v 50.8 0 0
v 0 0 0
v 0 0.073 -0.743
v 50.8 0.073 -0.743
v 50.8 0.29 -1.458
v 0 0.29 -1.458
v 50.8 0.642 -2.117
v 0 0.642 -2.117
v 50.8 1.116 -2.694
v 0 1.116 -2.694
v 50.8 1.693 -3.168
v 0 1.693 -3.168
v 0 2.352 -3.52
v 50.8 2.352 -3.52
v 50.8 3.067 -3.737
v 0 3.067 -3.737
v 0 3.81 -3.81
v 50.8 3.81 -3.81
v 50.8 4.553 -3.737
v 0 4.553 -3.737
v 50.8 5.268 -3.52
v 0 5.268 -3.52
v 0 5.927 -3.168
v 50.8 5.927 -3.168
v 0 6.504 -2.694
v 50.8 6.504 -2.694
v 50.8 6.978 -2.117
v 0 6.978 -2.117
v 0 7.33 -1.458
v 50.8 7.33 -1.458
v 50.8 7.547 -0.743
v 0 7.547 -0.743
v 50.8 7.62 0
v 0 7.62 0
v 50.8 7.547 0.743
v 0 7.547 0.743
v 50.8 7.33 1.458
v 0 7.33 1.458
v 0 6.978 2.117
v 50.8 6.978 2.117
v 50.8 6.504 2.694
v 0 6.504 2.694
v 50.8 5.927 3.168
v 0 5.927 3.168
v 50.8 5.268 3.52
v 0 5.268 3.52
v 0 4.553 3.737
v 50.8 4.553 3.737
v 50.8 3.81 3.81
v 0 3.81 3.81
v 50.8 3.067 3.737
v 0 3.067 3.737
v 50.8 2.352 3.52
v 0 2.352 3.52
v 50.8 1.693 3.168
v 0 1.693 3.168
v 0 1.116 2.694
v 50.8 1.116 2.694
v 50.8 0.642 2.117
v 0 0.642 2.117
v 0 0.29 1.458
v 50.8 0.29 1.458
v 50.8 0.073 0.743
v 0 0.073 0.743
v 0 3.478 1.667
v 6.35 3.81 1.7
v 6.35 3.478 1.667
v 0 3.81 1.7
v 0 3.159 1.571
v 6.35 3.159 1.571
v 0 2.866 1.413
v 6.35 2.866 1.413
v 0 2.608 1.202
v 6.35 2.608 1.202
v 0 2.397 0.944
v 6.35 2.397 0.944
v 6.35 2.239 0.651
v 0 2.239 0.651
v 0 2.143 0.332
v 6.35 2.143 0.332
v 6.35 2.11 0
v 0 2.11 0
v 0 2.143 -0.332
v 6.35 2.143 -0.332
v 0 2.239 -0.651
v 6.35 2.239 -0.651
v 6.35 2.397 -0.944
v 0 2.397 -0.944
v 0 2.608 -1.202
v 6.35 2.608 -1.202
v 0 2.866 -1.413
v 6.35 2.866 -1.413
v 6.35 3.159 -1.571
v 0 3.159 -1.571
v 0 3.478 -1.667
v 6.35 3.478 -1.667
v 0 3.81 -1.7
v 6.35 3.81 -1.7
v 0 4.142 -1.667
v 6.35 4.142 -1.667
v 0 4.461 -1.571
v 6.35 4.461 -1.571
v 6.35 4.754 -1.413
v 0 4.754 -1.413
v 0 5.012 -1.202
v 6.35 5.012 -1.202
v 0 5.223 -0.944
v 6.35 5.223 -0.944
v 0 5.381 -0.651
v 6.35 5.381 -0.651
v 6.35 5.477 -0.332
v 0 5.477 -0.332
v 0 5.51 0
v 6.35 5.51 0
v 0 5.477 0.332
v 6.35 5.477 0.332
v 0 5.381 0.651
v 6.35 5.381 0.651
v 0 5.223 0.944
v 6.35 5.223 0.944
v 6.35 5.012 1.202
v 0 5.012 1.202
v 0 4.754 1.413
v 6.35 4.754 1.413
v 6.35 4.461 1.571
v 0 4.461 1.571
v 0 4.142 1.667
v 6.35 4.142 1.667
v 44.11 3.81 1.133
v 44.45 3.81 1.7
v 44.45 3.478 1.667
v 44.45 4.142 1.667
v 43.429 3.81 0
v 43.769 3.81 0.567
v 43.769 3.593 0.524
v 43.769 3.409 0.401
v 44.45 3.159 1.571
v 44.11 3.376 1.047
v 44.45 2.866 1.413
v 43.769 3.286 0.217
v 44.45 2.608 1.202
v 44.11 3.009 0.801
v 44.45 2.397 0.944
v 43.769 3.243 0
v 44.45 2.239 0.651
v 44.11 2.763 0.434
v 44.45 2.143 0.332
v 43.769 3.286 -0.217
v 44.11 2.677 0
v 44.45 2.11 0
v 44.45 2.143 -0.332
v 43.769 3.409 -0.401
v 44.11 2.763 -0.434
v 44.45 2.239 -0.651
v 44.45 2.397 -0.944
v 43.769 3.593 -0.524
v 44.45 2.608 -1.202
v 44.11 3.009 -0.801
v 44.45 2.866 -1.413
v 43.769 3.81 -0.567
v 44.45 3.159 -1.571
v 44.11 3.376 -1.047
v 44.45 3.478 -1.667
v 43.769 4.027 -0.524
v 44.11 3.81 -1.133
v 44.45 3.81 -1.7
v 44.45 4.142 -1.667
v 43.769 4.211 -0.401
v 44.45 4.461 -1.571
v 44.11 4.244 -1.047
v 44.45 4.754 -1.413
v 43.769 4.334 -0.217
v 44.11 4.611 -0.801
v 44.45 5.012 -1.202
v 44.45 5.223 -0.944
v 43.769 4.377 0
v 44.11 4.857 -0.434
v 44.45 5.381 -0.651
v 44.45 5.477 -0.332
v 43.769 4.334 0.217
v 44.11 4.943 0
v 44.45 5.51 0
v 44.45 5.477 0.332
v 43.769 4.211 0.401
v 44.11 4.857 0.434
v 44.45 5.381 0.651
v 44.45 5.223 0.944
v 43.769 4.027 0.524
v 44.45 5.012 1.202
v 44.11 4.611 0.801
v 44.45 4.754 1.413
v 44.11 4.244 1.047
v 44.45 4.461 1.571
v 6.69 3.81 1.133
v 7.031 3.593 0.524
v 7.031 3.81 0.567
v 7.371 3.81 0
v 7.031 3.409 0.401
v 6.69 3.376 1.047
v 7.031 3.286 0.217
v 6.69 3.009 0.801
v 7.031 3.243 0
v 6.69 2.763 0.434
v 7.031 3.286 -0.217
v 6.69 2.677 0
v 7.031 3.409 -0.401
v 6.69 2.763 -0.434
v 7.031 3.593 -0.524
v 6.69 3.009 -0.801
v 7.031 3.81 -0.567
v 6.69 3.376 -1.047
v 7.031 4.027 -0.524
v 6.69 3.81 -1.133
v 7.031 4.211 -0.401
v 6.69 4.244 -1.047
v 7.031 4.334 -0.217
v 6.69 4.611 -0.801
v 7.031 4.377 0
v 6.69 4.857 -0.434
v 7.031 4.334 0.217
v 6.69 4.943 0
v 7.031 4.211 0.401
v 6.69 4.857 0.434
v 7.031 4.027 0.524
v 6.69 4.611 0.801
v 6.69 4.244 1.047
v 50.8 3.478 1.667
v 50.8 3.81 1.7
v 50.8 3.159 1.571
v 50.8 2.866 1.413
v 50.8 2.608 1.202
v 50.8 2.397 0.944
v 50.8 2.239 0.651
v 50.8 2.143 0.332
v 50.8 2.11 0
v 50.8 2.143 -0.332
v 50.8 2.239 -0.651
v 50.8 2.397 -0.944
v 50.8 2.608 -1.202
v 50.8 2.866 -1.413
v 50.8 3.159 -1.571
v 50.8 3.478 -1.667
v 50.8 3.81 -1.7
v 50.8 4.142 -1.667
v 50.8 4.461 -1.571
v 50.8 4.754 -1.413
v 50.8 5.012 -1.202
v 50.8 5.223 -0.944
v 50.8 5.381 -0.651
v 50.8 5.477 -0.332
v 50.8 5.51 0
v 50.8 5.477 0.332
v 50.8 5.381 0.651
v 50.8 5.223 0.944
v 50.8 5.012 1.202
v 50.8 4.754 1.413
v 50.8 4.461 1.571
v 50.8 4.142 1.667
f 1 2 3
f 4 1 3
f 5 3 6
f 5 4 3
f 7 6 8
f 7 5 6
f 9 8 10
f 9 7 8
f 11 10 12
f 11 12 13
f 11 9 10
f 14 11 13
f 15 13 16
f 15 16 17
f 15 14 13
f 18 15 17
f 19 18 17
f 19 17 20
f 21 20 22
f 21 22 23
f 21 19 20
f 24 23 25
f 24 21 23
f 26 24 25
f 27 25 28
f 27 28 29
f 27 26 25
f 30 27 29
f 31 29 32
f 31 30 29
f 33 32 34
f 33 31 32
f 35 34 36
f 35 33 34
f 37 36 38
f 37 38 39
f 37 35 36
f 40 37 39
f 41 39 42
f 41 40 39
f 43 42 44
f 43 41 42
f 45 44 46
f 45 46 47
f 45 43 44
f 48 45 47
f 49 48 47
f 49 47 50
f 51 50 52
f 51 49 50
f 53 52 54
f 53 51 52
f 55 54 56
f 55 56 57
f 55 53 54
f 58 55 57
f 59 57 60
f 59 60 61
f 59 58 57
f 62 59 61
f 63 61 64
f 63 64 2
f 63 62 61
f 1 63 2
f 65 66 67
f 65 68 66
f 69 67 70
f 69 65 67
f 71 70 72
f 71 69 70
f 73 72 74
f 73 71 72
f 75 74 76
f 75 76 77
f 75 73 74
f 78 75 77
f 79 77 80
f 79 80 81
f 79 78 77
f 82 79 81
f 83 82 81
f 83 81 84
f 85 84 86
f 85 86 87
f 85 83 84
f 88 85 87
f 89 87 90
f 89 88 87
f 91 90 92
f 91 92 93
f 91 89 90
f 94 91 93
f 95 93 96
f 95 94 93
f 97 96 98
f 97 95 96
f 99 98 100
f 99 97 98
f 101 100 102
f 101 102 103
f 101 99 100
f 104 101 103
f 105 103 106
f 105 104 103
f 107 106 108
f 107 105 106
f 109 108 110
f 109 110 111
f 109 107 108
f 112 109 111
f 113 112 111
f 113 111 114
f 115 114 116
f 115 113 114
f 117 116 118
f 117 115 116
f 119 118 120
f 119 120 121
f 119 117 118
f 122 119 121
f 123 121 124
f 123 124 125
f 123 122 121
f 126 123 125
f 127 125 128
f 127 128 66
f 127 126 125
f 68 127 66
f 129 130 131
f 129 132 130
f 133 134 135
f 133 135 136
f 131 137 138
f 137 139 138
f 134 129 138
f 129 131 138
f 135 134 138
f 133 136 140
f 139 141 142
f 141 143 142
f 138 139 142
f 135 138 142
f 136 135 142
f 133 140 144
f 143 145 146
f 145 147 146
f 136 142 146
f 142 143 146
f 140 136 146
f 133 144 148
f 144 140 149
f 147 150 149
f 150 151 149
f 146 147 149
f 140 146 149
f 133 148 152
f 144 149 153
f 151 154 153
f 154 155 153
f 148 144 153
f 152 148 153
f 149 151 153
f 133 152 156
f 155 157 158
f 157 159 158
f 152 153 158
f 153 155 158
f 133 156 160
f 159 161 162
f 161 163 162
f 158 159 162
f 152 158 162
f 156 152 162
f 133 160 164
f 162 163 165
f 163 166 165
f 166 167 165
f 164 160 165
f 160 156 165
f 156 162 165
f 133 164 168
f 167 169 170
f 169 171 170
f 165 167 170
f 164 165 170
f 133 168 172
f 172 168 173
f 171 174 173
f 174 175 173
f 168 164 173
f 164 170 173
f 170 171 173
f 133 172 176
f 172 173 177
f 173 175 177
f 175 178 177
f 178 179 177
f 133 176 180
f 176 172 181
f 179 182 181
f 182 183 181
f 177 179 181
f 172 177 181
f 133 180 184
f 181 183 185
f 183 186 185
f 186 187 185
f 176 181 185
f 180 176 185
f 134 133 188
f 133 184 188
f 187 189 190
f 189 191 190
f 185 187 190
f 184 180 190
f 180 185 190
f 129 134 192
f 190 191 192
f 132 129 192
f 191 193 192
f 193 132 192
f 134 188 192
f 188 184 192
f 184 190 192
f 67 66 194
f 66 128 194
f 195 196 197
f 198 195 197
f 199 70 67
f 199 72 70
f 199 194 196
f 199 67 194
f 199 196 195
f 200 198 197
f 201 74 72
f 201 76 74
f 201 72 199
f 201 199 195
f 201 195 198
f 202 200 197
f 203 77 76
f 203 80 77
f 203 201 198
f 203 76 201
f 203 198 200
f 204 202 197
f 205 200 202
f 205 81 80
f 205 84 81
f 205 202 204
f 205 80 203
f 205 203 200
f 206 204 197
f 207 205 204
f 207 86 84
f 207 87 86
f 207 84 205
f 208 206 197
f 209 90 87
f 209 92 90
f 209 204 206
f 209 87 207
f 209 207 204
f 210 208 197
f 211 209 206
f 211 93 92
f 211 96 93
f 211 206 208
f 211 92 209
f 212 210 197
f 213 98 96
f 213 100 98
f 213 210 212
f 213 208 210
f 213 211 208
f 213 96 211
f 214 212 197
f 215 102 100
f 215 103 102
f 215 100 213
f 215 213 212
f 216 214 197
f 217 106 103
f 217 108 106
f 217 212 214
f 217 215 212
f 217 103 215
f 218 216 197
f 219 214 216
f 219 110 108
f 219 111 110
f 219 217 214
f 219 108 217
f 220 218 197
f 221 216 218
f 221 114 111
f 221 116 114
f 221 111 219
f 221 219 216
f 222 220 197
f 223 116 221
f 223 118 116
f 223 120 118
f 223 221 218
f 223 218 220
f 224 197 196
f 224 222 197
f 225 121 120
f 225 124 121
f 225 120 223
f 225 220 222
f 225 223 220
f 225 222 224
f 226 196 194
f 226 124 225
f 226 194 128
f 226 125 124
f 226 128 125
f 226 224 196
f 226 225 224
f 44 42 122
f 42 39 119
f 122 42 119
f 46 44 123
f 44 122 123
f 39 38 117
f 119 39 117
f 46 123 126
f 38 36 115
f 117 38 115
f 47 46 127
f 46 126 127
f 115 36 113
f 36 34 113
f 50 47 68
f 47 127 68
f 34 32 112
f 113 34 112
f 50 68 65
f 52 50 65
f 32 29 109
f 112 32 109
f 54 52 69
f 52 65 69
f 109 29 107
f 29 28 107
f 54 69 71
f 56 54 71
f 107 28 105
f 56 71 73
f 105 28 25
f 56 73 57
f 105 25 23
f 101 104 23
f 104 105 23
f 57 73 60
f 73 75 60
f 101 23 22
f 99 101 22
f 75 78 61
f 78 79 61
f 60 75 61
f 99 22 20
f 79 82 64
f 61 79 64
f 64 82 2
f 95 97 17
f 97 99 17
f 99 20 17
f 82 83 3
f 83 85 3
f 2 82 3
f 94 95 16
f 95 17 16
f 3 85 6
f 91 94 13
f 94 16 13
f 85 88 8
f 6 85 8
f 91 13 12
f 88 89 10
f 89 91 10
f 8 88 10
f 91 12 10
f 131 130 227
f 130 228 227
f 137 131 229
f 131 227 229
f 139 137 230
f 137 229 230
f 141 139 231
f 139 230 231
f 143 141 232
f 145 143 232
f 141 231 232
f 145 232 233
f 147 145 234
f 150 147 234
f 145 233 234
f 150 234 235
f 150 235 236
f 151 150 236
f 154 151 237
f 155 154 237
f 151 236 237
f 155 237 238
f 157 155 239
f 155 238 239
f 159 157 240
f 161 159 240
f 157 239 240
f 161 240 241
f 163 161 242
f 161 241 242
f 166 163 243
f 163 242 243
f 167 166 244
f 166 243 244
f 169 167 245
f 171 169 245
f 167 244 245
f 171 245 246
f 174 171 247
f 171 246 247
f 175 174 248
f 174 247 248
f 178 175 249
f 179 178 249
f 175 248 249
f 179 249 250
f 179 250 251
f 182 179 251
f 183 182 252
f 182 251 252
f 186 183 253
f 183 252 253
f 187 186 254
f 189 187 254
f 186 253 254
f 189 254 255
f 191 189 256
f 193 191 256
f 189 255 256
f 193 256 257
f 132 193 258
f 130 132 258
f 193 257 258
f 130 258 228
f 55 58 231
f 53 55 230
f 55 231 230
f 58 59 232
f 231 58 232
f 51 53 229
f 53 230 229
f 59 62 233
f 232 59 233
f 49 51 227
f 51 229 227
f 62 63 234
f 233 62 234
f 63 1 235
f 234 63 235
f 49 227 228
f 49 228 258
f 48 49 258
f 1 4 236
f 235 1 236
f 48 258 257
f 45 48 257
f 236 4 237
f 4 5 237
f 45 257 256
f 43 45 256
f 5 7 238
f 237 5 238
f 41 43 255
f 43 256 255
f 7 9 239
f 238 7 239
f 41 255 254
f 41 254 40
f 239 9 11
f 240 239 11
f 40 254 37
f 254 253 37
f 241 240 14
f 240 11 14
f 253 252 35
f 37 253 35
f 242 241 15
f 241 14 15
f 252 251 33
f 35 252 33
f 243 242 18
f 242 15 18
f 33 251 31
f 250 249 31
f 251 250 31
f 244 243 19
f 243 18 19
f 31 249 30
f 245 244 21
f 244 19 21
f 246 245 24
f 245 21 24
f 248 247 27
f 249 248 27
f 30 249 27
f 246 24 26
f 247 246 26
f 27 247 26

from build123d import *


with BuildPart() as part:
    # Sketch1 → Revolve1 (revolve)
    with BuildSketch(Plane.XY):
        Polygon((0, 0), (0, 3.81), (50.8, 3.81), (50.8, 0), (37.892541774, 0), (12.907458226, 0), align=None)
    revolve(axis=Axis((0, 3.81, 0), (1, 0, 0)))

    # Sketch6 → M3 Clearance Hole1 (revolve, cut)
    with BuildSketch(Plane.ZX.offset(3.81)):
        Polygon((0, 0), (0, 7.371463052), (1.7, 6.35), (1.7, 0), align=None)
    m3_clearance_hole1 = revolve(axis=Axis((-6.35, 3.81, 0), (1, 0, 0)), mode=Mode.SUBTRACT)

    # Mirror1: M3 Clearance Hole1 across plane
    add(m3_clearance_hole1.mirror(Plane.ZY.offset(-25.4)), mode=Mode.SUBTRACT)


solid = part.part
